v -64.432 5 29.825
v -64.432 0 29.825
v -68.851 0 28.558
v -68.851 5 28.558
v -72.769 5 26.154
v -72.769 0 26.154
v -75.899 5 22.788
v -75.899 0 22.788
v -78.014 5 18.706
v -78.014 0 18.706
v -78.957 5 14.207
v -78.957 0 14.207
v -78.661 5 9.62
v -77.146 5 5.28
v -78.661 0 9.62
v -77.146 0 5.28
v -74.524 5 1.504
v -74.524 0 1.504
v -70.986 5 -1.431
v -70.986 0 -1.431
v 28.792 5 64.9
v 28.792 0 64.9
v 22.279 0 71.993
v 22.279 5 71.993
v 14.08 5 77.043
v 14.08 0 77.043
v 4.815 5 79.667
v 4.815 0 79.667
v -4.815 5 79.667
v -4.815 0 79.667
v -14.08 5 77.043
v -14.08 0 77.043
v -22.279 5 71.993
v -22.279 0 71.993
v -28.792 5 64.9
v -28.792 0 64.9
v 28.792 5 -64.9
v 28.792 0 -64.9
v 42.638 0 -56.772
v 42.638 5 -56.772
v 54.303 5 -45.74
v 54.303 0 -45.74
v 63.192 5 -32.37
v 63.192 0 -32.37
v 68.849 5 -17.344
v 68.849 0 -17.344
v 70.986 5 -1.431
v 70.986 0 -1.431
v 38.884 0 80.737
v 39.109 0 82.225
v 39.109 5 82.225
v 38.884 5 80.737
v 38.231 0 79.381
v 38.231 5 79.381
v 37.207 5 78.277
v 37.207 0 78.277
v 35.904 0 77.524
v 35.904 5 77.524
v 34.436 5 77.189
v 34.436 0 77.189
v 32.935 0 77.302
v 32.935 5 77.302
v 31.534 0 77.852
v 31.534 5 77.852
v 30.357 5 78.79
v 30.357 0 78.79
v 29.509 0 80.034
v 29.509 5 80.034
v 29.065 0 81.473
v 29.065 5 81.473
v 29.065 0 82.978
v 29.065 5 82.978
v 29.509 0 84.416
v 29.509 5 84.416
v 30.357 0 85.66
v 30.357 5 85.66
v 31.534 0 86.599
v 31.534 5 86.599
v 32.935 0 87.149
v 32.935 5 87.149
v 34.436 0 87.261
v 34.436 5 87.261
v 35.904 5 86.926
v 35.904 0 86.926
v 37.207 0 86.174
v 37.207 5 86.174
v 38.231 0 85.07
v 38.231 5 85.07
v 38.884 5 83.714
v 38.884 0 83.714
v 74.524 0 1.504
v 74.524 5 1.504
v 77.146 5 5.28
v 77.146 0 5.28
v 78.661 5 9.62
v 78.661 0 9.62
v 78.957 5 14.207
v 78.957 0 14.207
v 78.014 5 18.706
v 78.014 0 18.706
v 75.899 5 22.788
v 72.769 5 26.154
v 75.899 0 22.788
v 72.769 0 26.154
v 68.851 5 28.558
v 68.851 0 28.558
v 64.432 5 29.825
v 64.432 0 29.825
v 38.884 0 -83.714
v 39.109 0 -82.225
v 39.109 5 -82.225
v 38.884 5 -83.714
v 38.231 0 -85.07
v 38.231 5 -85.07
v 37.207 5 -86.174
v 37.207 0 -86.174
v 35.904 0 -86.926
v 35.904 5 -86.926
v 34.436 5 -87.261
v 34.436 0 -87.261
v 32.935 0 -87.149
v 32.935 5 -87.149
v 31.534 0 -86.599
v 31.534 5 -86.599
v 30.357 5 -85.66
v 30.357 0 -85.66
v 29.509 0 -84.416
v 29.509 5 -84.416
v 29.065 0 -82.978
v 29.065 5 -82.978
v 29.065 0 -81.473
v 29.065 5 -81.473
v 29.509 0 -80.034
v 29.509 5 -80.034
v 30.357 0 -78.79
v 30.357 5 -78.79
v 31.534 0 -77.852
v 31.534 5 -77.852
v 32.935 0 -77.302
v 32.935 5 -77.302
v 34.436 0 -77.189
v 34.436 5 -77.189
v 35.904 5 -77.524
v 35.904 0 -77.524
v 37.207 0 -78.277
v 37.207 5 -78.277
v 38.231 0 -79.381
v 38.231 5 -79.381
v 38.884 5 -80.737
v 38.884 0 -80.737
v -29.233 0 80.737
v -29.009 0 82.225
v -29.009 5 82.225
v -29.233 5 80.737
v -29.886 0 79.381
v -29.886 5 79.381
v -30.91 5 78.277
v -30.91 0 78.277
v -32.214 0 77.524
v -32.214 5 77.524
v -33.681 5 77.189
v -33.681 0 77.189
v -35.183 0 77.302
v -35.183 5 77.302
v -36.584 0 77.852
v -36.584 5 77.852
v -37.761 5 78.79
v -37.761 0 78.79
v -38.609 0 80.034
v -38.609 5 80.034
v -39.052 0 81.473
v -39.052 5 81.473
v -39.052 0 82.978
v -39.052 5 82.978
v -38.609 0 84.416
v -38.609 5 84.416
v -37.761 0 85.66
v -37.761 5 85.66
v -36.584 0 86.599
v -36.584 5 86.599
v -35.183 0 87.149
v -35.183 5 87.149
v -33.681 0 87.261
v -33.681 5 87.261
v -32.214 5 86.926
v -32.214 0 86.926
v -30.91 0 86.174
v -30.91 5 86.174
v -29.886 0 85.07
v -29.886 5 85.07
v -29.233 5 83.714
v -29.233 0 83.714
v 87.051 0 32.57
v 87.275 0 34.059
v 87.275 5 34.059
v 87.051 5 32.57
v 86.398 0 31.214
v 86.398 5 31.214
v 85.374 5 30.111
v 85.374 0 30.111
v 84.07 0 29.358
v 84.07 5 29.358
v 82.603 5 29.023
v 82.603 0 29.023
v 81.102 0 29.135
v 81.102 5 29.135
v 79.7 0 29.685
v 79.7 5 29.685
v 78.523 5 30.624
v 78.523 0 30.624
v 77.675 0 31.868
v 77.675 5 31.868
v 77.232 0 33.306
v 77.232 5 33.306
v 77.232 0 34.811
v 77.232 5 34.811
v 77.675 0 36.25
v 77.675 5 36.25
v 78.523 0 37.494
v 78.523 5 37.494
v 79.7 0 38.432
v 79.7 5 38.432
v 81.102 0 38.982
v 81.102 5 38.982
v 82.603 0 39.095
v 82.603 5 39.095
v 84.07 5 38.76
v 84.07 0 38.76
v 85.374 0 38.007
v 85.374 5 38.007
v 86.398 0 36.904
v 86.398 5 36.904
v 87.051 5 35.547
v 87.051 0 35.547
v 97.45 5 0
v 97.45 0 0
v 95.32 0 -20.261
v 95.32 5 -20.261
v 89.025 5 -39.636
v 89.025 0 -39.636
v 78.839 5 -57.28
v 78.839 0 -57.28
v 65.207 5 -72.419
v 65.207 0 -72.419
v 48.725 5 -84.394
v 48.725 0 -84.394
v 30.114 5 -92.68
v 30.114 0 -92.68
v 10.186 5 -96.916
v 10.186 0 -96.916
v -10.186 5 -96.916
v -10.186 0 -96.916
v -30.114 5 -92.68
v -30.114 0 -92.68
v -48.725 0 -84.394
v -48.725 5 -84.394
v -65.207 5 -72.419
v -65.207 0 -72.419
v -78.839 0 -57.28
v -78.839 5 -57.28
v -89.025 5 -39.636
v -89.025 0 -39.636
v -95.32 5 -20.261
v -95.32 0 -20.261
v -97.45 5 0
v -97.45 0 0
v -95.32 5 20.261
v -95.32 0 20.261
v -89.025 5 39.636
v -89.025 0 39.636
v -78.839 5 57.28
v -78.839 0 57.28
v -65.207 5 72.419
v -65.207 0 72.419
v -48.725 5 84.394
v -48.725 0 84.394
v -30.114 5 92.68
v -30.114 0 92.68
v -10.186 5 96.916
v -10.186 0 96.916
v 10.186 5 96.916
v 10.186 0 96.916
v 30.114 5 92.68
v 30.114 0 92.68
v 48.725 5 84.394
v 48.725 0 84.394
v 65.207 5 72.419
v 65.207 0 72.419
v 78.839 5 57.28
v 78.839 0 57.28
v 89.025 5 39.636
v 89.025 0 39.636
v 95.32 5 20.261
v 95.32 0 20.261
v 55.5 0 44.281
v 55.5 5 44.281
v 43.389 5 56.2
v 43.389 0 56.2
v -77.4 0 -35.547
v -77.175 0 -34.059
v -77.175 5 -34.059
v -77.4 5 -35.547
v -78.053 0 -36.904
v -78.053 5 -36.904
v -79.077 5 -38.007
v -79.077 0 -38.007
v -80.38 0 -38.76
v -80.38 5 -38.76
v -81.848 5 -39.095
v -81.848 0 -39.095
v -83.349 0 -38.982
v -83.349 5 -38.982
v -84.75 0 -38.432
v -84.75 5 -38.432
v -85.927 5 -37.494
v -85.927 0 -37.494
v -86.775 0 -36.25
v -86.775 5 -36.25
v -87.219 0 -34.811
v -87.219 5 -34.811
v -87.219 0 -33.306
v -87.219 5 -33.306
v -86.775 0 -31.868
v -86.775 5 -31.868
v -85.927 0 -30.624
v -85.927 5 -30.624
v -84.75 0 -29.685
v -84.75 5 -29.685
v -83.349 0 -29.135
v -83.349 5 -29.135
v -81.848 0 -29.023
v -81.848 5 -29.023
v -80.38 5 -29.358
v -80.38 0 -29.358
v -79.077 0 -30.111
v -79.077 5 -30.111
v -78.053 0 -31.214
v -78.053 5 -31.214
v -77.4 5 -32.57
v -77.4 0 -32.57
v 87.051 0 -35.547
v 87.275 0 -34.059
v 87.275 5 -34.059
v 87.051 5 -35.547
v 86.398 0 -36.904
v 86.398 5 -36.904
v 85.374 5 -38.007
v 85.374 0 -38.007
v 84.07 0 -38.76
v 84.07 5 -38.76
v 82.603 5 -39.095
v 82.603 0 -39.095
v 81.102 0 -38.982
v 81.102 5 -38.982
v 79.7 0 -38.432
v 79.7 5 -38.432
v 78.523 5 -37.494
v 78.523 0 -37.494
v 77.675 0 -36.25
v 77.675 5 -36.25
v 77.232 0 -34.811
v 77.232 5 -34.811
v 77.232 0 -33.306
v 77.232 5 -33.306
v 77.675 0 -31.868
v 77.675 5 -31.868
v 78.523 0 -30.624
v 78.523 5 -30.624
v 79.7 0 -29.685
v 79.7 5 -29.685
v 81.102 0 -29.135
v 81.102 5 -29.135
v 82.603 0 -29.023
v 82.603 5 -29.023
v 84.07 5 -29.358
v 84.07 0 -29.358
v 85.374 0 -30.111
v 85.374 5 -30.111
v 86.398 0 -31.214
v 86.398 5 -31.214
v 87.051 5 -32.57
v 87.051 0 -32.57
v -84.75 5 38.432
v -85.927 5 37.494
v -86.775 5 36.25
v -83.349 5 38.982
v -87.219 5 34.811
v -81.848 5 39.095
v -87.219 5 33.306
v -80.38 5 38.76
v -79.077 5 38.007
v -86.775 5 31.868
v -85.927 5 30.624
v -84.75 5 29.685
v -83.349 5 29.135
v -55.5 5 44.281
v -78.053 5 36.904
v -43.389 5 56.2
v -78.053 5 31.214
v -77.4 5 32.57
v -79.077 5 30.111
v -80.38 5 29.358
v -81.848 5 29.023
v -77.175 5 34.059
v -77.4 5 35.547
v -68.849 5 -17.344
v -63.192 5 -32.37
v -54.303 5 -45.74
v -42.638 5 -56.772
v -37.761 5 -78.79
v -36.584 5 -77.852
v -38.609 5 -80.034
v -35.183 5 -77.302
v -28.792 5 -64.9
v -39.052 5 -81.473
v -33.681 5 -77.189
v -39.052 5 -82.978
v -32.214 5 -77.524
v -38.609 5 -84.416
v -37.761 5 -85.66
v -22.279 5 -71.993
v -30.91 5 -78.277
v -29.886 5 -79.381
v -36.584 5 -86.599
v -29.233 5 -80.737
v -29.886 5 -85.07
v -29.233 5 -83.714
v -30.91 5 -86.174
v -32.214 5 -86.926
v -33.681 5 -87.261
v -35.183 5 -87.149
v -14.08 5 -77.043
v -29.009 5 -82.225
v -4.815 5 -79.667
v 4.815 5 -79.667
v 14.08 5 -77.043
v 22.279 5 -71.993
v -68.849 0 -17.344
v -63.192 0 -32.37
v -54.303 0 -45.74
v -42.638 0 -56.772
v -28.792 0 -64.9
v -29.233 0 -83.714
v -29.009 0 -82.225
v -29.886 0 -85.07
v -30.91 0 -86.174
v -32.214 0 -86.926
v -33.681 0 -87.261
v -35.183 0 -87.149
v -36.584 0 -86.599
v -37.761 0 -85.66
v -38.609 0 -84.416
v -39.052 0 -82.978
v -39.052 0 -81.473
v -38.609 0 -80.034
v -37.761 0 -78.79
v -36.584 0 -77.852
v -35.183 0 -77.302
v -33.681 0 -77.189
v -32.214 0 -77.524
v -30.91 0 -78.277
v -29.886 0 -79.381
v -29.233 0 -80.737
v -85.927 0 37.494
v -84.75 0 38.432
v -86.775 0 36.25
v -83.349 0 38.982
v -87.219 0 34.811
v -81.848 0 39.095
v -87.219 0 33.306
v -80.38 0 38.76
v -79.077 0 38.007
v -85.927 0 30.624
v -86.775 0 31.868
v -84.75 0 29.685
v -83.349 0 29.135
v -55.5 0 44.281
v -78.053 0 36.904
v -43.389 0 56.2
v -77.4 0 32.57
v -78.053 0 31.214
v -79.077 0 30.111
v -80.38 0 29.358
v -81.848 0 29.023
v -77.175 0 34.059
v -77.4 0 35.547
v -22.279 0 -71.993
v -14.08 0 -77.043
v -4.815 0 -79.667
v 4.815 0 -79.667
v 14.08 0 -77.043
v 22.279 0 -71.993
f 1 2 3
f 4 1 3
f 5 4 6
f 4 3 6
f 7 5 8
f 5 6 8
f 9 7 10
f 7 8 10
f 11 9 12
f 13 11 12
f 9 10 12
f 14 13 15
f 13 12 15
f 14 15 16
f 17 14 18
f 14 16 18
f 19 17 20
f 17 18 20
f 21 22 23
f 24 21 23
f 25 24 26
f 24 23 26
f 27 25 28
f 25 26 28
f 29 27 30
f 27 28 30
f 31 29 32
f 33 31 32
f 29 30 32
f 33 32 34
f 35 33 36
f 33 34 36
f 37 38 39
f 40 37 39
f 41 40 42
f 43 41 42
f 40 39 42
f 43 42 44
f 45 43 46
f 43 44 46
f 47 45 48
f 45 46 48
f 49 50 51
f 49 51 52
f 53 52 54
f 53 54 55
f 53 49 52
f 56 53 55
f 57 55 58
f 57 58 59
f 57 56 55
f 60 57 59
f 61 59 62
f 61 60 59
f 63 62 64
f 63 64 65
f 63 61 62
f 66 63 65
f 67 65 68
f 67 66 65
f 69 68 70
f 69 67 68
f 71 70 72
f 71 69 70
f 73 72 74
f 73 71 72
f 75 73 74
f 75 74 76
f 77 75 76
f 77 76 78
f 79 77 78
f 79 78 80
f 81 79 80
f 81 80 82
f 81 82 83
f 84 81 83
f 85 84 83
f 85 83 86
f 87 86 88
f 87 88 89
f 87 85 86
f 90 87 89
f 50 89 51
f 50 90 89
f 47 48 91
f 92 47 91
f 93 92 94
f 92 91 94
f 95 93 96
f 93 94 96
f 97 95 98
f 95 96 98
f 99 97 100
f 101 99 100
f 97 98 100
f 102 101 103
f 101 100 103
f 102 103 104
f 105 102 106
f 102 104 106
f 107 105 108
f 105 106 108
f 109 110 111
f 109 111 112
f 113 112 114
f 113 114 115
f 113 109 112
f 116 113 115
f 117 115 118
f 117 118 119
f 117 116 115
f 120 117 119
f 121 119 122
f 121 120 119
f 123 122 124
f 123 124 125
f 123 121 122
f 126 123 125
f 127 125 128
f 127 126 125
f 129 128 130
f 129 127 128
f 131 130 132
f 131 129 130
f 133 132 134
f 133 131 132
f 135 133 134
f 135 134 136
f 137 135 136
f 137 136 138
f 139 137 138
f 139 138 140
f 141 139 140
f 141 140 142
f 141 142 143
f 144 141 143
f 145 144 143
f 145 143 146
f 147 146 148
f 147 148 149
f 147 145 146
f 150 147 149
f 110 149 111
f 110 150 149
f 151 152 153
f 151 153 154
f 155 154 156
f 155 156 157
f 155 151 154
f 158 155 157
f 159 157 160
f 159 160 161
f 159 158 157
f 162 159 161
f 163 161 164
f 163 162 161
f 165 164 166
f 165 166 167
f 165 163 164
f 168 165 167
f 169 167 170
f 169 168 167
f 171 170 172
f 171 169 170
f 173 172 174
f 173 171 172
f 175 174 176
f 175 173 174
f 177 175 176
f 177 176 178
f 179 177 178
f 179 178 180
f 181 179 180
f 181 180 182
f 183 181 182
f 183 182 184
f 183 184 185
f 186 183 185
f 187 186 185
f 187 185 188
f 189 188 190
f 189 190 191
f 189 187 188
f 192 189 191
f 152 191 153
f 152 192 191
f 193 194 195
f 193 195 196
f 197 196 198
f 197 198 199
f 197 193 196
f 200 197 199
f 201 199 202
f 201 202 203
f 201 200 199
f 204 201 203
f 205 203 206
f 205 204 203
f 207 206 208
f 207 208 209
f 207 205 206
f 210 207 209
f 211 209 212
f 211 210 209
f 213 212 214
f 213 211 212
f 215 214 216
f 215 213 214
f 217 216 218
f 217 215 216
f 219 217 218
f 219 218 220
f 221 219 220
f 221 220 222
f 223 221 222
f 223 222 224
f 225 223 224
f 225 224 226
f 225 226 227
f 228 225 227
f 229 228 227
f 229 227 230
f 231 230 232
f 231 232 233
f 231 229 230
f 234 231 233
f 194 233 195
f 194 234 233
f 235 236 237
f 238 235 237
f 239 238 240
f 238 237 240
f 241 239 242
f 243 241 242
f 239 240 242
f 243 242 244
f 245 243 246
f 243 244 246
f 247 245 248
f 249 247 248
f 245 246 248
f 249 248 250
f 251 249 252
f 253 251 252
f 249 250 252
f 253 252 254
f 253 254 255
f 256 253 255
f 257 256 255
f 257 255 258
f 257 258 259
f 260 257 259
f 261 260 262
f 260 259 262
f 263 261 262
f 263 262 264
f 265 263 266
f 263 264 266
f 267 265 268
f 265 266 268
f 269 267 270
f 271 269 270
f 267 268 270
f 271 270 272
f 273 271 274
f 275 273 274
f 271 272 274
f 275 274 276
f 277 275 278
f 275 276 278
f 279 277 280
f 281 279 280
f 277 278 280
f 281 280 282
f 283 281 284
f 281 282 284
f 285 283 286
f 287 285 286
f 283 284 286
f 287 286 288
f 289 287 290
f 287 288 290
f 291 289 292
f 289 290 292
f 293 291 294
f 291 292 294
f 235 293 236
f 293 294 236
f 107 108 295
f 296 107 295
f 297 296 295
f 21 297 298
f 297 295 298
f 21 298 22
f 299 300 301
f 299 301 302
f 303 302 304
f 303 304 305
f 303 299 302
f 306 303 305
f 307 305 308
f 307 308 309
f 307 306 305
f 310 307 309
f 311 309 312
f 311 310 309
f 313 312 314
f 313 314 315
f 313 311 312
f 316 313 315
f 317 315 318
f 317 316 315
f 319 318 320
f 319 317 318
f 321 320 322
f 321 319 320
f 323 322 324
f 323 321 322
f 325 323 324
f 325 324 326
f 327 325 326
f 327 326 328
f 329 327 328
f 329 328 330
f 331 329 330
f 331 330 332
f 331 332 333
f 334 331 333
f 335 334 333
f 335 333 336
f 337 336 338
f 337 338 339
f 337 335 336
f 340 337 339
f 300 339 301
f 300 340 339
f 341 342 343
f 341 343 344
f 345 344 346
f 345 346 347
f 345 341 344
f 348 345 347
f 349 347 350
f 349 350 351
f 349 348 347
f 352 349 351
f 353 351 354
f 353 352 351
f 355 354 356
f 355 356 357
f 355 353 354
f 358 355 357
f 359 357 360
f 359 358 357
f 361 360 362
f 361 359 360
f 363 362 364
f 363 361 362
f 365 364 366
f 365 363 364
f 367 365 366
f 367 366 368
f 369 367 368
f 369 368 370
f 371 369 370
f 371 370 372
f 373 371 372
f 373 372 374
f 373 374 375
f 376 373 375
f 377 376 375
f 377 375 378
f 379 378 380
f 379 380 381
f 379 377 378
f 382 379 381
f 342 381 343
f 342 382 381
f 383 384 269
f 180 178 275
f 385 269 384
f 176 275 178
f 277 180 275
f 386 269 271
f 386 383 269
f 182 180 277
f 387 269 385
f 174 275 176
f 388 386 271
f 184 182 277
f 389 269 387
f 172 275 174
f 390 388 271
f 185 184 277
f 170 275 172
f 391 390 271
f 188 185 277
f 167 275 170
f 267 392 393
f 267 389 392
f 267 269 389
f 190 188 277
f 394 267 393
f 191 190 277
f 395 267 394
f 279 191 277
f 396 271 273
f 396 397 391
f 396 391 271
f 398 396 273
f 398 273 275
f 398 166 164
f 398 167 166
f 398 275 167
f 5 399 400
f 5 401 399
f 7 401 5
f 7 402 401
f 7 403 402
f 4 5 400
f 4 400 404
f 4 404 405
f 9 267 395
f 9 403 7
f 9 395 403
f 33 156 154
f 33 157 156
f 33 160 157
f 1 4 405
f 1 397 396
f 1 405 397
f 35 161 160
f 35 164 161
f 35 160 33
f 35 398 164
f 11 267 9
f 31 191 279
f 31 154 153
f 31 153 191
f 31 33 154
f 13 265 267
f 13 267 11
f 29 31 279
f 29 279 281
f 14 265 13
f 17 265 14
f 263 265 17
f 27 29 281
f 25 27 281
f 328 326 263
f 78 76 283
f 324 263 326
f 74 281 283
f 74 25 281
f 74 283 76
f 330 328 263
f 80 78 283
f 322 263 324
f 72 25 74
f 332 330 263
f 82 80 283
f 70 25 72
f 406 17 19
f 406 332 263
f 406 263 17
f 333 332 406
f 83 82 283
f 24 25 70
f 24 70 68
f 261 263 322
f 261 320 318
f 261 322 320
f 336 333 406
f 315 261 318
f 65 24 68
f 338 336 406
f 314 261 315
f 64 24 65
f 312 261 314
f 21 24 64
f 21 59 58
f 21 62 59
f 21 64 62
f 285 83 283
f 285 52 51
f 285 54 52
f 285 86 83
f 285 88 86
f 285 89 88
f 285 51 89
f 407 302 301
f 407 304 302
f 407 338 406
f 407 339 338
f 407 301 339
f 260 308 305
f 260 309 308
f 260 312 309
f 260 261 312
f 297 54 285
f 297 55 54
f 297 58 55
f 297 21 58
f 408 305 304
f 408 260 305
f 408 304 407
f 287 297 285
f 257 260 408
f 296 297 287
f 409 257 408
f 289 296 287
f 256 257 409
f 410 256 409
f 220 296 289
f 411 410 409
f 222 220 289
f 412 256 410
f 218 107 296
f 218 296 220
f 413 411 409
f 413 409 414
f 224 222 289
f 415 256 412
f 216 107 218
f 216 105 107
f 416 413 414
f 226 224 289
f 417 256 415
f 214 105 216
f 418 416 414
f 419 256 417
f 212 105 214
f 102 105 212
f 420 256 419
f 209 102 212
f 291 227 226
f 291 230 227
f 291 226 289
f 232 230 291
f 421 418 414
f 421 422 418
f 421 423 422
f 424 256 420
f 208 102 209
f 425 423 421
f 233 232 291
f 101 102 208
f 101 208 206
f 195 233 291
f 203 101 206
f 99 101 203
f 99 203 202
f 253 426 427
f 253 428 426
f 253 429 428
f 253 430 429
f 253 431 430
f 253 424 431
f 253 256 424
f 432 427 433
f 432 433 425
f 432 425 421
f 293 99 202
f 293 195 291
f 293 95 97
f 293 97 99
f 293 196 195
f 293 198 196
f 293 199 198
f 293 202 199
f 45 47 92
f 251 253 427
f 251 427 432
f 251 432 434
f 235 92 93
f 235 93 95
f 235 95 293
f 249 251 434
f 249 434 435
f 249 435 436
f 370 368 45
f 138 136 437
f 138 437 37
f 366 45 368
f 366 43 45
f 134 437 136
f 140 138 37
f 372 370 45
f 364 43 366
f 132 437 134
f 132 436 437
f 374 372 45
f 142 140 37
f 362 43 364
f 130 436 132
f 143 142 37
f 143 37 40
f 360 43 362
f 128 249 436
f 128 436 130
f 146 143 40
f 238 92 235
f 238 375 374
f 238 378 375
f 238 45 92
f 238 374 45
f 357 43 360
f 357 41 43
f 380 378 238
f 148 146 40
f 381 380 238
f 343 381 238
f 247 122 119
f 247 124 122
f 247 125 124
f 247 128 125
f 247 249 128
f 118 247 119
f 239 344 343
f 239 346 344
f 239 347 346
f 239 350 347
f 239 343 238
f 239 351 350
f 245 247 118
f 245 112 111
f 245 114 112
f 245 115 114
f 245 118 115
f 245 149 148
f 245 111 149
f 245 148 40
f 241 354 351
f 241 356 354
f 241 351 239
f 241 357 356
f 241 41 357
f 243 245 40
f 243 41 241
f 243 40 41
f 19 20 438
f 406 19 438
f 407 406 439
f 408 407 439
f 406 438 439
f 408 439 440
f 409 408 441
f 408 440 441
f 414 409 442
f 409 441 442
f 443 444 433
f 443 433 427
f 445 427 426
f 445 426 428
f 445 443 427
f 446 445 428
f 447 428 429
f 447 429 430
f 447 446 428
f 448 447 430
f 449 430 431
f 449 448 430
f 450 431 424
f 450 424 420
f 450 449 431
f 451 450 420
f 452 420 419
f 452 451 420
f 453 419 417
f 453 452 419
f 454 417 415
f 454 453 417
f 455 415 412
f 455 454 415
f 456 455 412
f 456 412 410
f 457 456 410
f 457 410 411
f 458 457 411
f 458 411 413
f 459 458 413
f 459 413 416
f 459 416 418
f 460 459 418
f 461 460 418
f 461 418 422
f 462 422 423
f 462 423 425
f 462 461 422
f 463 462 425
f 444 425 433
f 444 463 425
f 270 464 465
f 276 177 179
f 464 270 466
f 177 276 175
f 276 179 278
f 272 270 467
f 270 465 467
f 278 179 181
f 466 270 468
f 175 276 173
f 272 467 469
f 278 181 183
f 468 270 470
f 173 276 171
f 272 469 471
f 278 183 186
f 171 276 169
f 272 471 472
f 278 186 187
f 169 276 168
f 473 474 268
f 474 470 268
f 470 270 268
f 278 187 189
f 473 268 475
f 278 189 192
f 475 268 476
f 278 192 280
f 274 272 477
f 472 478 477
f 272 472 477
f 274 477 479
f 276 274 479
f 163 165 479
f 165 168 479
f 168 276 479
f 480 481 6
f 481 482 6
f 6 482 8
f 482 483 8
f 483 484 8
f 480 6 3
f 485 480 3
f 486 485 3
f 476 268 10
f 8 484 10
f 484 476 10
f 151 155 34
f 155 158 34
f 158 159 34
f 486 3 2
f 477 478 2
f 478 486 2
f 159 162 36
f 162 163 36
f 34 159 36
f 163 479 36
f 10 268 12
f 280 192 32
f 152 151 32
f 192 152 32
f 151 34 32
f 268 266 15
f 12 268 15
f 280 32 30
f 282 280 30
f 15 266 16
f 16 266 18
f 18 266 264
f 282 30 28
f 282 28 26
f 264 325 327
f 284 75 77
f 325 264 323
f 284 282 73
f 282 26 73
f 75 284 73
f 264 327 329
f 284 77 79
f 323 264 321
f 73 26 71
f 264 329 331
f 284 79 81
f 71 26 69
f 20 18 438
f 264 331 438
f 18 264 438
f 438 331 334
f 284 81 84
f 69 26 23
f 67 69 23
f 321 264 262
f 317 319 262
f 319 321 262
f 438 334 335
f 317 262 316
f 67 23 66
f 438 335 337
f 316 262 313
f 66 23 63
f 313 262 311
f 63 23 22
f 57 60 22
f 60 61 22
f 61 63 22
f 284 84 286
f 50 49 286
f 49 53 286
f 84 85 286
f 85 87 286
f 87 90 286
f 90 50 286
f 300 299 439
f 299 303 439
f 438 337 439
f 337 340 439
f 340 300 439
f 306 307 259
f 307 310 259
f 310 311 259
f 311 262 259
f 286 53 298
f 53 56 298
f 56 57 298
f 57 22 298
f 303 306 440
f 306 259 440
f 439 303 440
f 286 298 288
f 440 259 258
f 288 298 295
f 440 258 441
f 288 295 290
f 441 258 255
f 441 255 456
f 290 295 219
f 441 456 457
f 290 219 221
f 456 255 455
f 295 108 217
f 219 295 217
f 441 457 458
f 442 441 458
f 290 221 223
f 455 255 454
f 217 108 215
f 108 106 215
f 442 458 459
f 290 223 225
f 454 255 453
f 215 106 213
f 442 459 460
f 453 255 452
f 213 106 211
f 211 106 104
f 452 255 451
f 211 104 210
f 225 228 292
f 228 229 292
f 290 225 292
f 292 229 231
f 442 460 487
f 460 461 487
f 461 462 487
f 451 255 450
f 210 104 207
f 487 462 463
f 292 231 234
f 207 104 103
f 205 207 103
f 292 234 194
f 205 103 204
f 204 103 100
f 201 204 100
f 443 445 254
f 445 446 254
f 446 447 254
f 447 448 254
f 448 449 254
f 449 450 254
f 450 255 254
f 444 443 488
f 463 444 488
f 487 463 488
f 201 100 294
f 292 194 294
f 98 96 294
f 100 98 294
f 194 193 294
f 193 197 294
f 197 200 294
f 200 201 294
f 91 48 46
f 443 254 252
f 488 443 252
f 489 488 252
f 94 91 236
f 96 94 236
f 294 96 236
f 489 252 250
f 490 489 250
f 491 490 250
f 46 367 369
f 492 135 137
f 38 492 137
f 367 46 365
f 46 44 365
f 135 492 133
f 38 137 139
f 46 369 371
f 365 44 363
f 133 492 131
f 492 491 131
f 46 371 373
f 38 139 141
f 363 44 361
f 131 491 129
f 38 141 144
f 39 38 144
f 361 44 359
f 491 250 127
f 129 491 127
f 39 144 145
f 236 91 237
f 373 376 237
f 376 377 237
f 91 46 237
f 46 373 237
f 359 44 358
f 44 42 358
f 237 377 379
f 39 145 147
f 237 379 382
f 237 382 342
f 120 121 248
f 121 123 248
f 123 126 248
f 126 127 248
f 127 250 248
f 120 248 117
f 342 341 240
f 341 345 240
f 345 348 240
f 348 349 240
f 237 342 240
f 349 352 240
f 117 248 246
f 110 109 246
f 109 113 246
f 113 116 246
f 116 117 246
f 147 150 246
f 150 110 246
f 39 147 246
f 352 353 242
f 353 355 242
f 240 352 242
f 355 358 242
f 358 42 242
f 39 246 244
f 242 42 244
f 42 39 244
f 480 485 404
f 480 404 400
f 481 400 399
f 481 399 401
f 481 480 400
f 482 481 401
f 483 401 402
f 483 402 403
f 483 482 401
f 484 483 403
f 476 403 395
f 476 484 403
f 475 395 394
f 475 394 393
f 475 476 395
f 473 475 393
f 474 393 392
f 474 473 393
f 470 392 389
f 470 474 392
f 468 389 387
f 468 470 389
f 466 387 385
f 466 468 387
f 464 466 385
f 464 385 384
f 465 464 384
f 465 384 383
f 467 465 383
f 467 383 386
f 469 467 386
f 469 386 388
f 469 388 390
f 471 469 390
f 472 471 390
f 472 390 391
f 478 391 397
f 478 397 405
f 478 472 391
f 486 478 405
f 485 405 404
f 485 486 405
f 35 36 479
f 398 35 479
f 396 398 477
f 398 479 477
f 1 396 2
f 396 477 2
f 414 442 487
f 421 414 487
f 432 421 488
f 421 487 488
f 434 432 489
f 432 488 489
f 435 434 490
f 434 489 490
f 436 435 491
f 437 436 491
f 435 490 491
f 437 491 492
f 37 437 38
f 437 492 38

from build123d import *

# Parameters (mm, degrees)
SKETCH2_R           = 97.45
SKETCH2_R_2         = 5.05
BOSS_EXTRUDE1_DEPTH = 5


with BuildPart() as part:
    # Sketch2 → Boss-Extrude1 (new body)
    with BuildSketch(Plane(origin=(0, 0, 0), x_dir=(1, 0, 0), z_dir=(0, 1, 0))):
        Circle(SKETCH2_R)
        with Locations((-34.05882548, -82.225278394)):
            Circle(SKETCH2_R_2, mode=Mode.SUBTRACT)
        with Locations((-82.225278394, -34.05882548)):
            Circle(SKETCH2_R_2, mode=Mode.SUBTRACT)
        with Locations((34.05882548, -82.225278394)):
            Circle(SKETCH2_R_2, mode=Mode.SUBTRACT)
        with Locations((82.225278394, -34.05882548)):
            Circle(SKETCH2_R_2, mode=Mode.SUBTRACT)
        with Locations((-82.225278394, 34.05882548)):
            Circle(SKETCH2_R_2, mode=Mode.SUBTRACT)
        with Locations((-34.05882548, 82.225278394)):
            Circle(SKETCH2_R_2, mode=Mode.SUBTRACT)
        with BuildLine():
            ThreePointArc((-64.431819773, -29.825167238), (-78.638188145, -16.488652353), (-70.985573699, 1.431197639))
            ThreePointArc((-70.985573699, 1.431197639), (-59.126750062, 39.306836901), (-28.79218644, 64.9))
            ThreePointArc((-28.79218644, 64.9), (0, 80), (28.79218644, 64.9))
            ThreePointArc((28.79218644, 64.9), (59.126750062, 39.306836901), (70.985573699, 1.431197639))
            ThreePointArc((70.985573699, 1.431197639), (78.638188145, -16.488652353), (64.431819773, -29.825167238))
            ThreePointArc((64.431819773, -29.825167238), (49.802006053, -50.603954323), (28.79218644, -64.9))
            ThreePointArc((28.79218644, -64.9), (0, -80), (-28.79218644, -64.9))
            ThreePointArc((-28.79218644, -64.9), (-49.802006053, -50.603954323), (-64.431819773, -29.825167238))
        make_face(mode=Mode.SUBTRACT)
        with Locations((82.225278394, 34.05882548)):
            Circle(SKETCH2_R_2, mode=Mode.SUBTRACT)
        with Locations((34.05882548, 82.225278394)):
            Circle(SKETCH2_R_2, mode=Mode.SUBTRACT)
    extrude(amount=BOSS_EXTRUDE1_DEPTH)


solid = part.part
